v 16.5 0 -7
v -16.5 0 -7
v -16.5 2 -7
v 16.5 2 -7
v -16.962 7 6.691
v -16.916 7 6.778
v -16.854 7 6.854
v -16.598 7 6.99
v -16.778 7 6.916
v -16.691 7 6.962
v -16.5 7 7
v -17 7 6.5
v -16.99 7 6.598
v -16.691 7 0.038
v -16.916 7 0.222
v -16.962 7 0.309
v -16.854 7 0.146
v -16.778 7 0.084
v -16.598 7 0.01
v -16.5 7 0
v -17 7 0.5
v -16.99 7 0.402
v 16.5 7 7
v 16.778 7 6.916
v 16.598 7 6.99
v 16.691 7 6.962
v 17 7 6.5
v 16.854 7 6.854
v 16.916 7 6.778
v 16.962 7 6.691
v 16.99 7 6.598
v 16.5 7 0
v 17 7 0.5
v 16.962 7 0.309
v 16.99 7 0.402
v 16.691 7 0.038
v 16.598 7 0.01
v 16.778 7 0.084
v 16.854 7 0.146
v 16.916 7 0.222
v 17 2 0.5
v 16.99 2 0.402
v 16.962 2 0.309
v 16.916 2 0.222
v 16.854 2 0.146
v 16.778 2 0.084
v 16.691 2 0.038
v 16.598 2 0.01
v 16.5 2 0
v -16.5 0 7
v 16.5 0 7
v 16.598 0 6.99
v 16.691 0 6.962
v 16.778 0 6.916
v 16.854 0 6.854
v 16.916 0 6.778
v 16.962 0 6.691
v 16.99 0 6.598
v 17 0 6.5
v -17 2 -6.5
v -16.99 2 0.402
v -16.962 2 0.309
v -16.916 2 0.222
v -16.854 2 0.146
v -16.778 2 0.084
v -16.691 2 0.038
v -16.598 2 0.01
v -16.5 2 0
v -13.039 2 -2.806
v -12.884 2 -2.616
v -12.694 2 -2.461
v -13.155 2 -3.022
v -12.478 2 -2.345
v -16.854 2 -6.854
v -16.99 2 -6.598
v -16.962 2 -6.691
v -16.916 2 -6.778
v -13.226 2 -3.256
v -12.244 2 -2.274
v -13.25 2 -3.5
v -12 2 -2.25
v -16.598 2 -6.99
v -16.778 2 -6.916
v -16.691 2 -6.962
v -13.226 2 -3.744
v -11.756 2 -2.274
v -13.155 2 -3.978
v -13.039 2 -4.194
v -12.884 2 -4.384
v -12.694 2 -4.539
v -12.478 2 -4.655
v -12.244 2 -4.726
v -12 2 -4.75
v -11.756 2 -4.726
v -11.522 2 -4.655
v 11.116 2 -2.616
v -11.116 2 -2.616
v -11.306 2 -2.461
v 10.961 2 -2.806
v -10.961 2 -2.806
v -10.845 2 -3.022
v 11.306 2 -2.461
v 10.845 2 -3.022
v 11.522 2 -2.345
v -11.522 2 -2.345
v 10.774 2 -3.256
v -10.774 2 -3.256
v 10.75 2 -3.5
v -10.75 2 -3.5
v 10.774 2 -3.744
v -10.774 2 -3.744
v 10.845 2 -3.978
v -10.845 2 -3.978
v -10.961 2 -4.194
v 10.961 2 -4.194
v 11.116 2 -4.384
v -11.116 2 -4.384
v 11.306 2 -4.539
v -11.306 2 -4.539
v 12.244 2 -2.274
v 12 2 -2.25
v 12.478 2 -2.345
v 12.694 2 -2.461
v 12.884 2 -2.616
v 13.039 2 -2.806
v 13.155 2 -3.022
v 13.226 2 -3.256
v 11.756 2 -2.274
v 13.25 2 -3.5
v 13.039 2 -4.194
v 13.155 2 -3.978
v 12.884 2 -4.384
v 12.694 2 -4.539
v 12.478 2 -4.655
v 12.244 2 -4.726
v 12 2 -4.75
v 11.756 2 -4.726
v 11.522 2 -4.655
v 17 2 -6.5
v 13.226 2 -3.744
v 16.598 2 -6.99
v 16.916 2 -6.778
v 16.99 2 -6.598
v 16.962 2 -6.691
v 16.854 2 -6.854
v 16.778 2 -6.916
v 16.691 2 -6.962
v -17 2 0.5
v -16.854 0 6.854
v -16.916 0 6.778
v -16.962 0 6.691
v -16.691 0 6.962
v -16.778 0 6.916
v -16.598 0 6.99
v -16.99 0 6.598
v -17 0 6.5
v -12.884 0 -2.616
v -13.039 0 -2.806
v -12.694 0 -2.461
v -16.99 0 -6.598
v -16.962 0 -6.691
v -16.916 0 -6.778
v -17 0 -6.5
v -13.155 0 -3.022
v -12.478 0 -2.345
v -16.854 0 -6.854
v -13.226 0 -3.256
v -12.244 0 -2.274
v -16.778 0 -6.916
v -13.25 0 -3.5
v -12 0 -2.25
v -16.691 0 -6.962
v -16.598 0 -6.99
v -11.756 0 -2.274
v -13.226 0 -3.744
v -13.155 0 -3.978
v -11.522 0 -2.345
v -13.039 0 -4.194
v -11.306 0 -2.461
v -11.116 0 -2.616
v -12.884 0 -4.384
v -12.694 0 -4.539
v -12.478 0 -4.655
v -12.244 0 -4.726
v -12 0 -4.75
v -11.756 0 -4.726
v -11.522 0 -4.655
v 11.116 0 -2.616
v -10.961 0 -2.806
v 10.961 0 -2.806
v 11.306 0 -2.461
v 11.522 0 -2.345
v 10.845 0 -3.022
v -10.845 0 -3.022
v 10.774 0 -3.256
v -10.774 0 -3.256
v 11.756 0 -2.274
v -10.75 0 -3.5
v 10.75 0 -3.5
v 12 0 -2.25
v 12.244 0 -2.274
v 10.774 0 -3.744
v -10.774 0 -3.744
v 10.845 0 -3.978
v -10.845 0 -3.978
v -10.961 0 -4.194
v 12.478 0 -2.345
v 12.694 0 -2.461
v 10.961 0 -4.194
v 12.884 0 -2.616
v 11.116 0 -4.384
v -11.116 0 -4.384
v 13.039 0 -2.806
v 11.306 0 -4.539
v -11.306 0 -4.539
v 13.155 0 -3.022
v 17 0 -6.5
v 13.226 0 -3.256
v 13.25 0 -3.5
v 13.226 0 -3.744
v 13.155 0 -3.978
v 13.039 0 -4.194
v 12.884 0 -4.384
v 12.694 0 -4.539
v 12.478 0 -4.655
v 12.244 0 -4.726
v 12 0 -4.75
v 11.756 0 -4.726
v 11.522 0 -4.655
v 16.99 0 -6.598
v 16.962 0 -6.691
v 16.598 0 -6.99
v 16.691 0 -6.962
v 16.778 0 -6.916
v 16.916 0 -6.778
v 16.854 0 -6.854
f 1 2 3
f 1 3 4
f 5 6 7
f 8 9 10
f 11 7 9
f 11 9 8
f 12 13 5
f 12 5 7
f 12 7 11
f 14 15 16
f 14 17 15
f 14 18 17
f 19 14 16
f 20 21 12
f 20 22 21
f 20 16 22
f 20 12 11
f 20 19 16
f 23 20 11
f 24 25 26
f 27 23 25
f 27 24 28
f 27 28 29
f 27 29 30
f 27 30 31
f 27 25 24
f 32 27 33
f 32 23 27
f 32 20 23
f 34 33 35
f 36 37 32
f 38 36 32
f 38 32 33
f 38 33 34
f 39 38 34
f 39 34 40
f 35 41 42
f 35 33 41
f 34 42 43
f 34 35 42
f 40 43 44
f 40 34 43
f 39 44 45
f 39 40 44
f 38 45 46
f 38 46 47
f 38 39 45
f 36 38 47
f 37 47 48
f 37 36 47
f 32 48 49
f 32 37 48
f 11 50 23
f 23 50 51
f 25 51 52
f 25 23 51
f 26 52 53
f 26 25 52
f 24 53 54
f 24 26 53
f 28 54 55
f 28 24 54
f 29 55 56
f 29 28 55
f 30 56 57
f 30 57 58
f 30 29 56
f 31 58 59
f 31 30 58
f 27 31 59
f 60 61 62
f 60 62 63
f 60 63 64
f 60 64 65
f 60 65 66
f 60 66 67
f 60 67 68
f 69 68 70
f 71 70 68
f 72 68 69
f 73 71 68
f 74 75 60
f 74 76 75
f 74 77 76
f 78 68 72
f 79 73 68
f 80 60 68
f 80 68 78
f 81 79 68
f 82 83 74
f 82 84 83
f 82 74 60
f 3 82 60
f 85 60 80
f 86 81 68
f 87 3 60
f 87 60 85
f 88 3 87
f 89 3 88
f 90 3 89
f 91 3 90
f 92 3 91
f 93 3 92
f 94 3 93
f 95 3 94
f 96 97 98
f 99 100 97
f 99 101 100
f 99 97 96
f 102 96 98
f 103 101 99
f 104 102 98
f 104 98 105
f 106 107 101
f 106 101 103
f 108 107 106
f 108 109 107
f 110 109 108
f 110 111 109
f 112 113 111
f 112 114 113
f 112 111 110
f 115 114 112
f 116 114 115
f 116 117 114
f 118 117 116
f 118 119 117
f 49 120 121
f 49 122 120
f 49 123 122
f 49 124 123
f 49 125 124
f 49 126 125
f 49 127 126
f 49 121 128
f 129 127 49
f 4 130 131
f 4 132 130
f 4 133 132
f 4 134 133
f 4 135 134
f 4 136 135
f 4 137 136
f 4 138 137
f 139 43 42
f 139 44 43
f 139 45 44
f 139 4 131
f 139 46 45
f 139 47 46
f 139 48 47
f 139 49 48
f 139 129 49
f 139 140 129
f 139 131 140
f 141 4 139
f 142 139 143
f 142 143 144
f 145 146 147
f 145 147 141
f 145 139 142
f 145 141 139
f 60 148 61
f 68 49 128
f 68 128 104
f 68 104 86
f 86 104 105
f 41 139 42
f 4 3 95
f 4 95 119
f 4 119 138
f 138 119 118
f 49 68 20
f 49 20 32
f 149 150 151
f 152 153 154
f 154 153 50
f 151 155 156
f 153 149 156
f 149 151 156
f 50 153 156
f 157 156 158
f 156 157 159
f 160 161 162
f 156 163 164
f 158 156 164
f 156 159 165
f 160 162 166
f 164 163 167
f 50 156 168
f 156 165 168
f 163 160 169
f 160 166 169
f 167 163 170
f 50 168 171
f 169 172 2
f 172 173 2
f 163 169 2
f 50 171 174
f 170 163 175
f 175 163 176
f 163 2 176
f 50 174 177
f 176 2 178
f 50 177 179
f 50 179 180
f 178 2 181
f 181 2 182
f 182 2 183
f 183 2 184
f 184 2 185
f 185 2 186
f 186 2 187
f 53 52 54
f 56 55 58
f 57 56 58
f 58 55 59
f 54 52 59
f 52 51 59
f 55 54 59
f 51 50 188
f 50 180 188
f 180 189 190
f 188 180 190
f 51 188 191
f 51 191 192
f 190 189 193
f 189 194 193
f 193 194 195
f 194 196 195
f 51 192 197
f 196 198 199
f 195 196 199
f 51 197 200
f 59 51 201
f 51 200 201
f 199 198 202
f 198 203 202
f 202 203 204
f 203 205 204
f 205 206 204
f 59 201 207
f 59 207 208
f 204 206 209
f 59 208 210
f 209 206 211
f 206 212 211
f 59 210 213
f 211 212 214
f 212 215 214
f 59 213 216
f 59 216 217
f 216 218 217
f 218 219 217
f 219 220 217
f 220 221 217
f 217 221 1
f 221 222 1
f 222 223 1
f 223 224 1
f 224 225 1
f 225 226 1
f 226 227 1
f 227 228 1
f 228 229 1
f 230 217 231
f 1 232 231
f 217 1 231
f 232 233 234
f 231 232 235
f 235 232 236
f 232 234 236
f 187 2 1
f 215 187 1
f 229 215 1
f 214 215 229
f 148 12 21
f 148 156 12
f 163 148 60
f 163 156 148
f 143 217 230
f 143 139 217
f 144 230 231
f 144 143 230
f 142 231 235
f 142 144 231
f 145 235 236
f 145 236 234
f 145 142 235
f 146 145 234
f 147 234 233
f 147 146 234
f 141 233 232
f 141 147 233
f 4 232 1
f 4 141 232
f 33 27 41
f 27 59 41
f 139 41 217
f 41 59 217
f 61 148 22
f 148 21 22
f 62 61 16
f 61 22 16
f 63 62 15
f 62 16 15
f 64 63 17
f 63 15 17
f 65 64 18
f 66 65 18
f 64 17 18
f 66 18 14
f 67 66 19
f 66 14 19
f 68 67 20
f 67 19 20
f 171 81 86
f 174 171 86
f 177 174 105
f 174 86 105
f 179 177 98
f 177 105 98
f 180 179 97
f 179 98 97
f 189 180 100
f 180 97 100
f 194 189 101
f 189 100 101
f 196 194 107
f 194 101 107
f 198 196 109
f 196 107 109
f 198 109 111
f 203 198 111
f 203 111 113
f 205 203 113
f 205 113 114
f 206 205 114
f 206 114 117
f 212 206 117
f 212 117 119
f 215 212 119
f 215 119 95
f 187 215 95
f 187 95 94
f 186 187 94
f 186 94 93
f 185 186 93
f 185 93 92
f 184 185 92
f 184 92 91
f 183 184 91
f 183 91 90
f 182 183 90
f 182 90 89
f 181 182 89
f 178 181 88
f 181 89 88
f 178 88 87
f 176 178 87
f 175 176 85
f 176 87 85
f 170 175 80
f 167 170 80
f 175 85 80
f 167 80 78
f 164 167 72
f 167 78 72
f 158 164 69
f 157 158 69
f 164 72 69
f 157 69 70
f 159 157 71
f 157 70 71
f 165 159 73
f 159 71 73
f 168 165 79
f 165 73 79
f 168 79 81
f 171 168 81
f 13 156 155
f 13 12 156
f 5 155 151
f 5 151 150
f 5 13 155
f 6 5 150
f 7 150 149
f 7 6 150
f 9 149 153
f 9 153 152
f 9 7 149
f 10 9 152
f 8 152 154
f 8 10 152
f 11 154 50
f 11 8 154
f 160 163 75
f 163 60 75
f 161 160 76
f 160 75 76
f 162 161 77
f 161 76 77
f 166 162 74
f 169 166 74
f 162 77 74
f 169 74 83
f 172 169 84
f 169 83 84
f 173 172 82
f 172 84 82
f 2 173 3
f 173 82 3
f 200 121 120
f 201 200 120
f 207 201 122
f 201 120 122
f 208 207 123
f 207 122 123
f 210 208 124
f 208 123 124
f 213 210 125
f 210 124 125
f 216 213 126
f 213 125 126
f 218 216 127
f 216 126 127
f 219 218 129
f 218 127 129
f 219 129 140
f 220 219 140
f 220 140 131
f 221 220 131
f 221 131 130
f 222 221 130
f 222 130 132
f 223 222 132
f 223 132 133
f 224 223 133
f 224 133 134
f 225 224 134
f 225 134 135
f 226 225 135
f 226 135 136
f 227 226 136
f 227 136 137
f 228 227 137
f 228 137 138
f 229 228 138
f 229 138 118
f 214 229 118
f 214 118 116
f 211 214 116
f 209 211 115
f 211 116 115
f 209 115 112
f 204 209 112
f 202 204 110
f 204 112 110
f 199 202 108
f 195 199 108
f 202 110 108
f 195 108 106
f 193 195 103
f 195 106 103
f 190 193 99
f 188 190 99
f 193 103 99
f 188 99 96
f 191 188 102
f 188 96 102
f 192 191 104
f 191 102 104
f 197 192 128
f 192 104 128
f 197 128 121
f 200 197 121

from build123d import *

# Parameters (mm, degrees)
SKETCH1_W           = 34
SKETCH1_H           = 14
BOSS_EXTRUDE1_DEPTH = 2
SKETCH2_W           = 34
SKETCH2_H           = 7
BOSS_EXTRUDE2_DEPTH = 5
FILLET1_R           = 0.5
CUT_EXTRUDE1_REACH  = 21.053
SKETCH3_R           = 1.25


with BuildPart() as part:
    # Sketch1 → Boss-Extrude1 (new body)
    with BuildSketch(Plane(origin=(0, 0, 0), x_dir=(1, 0, 0), z_dir=(0, 1, 0))):
        Rectangle(SKETCH1_W, SKETCH1_H)
    extrude(amount=BOSS_EXTRUDE1_DEPTH)

    # Sketch2 → Boss-Extrude2 (add)
    with BuildSketch(Plane(origin=(0, 2, 0), x_dir=(1, 0, 0), z_dir=(0, 1, 0))):
        with Locations((0, -3.5)):
            Rectangle(SKETCH2_W, SKETCH2_H)
    extrude(amount=BOSS_EXTRUDE2_DEPTH)

    # Fillet1
    fillet1_edges = [part.edges().sort_by_distance(p)[0] for p in [
        (17, 4.5, 0),
        (-17, 4.5, 0),
        (17, 3.5, 7),
        (-17, 3.5, 7),
        (-17, 1, -7),
        (17, 1, -7),
    ]]
    fillet(fillet1_edges, radius=FILLET1_R)

    # Sketch3 → Cut-Extrude1 (cut, up to next)
    with BuildSketch(Plane(origin=(0, 2, 0), x_dir=(1, 0, 0), z_dir=(0, 1, 0)), mode=Mode.PRIVATE) as cut_extrude1_sk1:
        with Locations(Location((12, 3.5, 0), (0, 0, 270))):
            Circle(SKETCH3_R)
    cut_extrude1_tool1 = extrude(cut_extrude1_sk1.sketch, amount=-CUT_EXTRUDE1_REACH, mode=Mode.PRIVATE) & part.part
    # Sketch3 → Cut-Extrude1 (cut, up to next)
    with BuildSketch(Plane(origin=(0, 2, 0), x_dir=(1, 0, 0), z_dir=(0, 1, 0)), mode=Mode.PRIVATE) as cut_extrude1_sk2:
        with Locations(Location((-12, 3.5, 0), (0, 0, 270))):
            Circle(SKETCH3_R)
    cut_extrude1_tool2 = extrude(cut_extrude1_sk2.sketch, amount=-CUT_EXTRUDE1_REACH, mode=Mode.PRIVATE) & part.part
    add(cut_extrude1_tool1.solids().sort_by_distance((12, 2, -3.5))[0], mode=Mode.SUBTRACT)
    add(cut_extrude1_tool2.solids().sort_by_distance((-12, 2, -3.5))[0], mode=Mode.SUBTRACT)


solid = part.part
